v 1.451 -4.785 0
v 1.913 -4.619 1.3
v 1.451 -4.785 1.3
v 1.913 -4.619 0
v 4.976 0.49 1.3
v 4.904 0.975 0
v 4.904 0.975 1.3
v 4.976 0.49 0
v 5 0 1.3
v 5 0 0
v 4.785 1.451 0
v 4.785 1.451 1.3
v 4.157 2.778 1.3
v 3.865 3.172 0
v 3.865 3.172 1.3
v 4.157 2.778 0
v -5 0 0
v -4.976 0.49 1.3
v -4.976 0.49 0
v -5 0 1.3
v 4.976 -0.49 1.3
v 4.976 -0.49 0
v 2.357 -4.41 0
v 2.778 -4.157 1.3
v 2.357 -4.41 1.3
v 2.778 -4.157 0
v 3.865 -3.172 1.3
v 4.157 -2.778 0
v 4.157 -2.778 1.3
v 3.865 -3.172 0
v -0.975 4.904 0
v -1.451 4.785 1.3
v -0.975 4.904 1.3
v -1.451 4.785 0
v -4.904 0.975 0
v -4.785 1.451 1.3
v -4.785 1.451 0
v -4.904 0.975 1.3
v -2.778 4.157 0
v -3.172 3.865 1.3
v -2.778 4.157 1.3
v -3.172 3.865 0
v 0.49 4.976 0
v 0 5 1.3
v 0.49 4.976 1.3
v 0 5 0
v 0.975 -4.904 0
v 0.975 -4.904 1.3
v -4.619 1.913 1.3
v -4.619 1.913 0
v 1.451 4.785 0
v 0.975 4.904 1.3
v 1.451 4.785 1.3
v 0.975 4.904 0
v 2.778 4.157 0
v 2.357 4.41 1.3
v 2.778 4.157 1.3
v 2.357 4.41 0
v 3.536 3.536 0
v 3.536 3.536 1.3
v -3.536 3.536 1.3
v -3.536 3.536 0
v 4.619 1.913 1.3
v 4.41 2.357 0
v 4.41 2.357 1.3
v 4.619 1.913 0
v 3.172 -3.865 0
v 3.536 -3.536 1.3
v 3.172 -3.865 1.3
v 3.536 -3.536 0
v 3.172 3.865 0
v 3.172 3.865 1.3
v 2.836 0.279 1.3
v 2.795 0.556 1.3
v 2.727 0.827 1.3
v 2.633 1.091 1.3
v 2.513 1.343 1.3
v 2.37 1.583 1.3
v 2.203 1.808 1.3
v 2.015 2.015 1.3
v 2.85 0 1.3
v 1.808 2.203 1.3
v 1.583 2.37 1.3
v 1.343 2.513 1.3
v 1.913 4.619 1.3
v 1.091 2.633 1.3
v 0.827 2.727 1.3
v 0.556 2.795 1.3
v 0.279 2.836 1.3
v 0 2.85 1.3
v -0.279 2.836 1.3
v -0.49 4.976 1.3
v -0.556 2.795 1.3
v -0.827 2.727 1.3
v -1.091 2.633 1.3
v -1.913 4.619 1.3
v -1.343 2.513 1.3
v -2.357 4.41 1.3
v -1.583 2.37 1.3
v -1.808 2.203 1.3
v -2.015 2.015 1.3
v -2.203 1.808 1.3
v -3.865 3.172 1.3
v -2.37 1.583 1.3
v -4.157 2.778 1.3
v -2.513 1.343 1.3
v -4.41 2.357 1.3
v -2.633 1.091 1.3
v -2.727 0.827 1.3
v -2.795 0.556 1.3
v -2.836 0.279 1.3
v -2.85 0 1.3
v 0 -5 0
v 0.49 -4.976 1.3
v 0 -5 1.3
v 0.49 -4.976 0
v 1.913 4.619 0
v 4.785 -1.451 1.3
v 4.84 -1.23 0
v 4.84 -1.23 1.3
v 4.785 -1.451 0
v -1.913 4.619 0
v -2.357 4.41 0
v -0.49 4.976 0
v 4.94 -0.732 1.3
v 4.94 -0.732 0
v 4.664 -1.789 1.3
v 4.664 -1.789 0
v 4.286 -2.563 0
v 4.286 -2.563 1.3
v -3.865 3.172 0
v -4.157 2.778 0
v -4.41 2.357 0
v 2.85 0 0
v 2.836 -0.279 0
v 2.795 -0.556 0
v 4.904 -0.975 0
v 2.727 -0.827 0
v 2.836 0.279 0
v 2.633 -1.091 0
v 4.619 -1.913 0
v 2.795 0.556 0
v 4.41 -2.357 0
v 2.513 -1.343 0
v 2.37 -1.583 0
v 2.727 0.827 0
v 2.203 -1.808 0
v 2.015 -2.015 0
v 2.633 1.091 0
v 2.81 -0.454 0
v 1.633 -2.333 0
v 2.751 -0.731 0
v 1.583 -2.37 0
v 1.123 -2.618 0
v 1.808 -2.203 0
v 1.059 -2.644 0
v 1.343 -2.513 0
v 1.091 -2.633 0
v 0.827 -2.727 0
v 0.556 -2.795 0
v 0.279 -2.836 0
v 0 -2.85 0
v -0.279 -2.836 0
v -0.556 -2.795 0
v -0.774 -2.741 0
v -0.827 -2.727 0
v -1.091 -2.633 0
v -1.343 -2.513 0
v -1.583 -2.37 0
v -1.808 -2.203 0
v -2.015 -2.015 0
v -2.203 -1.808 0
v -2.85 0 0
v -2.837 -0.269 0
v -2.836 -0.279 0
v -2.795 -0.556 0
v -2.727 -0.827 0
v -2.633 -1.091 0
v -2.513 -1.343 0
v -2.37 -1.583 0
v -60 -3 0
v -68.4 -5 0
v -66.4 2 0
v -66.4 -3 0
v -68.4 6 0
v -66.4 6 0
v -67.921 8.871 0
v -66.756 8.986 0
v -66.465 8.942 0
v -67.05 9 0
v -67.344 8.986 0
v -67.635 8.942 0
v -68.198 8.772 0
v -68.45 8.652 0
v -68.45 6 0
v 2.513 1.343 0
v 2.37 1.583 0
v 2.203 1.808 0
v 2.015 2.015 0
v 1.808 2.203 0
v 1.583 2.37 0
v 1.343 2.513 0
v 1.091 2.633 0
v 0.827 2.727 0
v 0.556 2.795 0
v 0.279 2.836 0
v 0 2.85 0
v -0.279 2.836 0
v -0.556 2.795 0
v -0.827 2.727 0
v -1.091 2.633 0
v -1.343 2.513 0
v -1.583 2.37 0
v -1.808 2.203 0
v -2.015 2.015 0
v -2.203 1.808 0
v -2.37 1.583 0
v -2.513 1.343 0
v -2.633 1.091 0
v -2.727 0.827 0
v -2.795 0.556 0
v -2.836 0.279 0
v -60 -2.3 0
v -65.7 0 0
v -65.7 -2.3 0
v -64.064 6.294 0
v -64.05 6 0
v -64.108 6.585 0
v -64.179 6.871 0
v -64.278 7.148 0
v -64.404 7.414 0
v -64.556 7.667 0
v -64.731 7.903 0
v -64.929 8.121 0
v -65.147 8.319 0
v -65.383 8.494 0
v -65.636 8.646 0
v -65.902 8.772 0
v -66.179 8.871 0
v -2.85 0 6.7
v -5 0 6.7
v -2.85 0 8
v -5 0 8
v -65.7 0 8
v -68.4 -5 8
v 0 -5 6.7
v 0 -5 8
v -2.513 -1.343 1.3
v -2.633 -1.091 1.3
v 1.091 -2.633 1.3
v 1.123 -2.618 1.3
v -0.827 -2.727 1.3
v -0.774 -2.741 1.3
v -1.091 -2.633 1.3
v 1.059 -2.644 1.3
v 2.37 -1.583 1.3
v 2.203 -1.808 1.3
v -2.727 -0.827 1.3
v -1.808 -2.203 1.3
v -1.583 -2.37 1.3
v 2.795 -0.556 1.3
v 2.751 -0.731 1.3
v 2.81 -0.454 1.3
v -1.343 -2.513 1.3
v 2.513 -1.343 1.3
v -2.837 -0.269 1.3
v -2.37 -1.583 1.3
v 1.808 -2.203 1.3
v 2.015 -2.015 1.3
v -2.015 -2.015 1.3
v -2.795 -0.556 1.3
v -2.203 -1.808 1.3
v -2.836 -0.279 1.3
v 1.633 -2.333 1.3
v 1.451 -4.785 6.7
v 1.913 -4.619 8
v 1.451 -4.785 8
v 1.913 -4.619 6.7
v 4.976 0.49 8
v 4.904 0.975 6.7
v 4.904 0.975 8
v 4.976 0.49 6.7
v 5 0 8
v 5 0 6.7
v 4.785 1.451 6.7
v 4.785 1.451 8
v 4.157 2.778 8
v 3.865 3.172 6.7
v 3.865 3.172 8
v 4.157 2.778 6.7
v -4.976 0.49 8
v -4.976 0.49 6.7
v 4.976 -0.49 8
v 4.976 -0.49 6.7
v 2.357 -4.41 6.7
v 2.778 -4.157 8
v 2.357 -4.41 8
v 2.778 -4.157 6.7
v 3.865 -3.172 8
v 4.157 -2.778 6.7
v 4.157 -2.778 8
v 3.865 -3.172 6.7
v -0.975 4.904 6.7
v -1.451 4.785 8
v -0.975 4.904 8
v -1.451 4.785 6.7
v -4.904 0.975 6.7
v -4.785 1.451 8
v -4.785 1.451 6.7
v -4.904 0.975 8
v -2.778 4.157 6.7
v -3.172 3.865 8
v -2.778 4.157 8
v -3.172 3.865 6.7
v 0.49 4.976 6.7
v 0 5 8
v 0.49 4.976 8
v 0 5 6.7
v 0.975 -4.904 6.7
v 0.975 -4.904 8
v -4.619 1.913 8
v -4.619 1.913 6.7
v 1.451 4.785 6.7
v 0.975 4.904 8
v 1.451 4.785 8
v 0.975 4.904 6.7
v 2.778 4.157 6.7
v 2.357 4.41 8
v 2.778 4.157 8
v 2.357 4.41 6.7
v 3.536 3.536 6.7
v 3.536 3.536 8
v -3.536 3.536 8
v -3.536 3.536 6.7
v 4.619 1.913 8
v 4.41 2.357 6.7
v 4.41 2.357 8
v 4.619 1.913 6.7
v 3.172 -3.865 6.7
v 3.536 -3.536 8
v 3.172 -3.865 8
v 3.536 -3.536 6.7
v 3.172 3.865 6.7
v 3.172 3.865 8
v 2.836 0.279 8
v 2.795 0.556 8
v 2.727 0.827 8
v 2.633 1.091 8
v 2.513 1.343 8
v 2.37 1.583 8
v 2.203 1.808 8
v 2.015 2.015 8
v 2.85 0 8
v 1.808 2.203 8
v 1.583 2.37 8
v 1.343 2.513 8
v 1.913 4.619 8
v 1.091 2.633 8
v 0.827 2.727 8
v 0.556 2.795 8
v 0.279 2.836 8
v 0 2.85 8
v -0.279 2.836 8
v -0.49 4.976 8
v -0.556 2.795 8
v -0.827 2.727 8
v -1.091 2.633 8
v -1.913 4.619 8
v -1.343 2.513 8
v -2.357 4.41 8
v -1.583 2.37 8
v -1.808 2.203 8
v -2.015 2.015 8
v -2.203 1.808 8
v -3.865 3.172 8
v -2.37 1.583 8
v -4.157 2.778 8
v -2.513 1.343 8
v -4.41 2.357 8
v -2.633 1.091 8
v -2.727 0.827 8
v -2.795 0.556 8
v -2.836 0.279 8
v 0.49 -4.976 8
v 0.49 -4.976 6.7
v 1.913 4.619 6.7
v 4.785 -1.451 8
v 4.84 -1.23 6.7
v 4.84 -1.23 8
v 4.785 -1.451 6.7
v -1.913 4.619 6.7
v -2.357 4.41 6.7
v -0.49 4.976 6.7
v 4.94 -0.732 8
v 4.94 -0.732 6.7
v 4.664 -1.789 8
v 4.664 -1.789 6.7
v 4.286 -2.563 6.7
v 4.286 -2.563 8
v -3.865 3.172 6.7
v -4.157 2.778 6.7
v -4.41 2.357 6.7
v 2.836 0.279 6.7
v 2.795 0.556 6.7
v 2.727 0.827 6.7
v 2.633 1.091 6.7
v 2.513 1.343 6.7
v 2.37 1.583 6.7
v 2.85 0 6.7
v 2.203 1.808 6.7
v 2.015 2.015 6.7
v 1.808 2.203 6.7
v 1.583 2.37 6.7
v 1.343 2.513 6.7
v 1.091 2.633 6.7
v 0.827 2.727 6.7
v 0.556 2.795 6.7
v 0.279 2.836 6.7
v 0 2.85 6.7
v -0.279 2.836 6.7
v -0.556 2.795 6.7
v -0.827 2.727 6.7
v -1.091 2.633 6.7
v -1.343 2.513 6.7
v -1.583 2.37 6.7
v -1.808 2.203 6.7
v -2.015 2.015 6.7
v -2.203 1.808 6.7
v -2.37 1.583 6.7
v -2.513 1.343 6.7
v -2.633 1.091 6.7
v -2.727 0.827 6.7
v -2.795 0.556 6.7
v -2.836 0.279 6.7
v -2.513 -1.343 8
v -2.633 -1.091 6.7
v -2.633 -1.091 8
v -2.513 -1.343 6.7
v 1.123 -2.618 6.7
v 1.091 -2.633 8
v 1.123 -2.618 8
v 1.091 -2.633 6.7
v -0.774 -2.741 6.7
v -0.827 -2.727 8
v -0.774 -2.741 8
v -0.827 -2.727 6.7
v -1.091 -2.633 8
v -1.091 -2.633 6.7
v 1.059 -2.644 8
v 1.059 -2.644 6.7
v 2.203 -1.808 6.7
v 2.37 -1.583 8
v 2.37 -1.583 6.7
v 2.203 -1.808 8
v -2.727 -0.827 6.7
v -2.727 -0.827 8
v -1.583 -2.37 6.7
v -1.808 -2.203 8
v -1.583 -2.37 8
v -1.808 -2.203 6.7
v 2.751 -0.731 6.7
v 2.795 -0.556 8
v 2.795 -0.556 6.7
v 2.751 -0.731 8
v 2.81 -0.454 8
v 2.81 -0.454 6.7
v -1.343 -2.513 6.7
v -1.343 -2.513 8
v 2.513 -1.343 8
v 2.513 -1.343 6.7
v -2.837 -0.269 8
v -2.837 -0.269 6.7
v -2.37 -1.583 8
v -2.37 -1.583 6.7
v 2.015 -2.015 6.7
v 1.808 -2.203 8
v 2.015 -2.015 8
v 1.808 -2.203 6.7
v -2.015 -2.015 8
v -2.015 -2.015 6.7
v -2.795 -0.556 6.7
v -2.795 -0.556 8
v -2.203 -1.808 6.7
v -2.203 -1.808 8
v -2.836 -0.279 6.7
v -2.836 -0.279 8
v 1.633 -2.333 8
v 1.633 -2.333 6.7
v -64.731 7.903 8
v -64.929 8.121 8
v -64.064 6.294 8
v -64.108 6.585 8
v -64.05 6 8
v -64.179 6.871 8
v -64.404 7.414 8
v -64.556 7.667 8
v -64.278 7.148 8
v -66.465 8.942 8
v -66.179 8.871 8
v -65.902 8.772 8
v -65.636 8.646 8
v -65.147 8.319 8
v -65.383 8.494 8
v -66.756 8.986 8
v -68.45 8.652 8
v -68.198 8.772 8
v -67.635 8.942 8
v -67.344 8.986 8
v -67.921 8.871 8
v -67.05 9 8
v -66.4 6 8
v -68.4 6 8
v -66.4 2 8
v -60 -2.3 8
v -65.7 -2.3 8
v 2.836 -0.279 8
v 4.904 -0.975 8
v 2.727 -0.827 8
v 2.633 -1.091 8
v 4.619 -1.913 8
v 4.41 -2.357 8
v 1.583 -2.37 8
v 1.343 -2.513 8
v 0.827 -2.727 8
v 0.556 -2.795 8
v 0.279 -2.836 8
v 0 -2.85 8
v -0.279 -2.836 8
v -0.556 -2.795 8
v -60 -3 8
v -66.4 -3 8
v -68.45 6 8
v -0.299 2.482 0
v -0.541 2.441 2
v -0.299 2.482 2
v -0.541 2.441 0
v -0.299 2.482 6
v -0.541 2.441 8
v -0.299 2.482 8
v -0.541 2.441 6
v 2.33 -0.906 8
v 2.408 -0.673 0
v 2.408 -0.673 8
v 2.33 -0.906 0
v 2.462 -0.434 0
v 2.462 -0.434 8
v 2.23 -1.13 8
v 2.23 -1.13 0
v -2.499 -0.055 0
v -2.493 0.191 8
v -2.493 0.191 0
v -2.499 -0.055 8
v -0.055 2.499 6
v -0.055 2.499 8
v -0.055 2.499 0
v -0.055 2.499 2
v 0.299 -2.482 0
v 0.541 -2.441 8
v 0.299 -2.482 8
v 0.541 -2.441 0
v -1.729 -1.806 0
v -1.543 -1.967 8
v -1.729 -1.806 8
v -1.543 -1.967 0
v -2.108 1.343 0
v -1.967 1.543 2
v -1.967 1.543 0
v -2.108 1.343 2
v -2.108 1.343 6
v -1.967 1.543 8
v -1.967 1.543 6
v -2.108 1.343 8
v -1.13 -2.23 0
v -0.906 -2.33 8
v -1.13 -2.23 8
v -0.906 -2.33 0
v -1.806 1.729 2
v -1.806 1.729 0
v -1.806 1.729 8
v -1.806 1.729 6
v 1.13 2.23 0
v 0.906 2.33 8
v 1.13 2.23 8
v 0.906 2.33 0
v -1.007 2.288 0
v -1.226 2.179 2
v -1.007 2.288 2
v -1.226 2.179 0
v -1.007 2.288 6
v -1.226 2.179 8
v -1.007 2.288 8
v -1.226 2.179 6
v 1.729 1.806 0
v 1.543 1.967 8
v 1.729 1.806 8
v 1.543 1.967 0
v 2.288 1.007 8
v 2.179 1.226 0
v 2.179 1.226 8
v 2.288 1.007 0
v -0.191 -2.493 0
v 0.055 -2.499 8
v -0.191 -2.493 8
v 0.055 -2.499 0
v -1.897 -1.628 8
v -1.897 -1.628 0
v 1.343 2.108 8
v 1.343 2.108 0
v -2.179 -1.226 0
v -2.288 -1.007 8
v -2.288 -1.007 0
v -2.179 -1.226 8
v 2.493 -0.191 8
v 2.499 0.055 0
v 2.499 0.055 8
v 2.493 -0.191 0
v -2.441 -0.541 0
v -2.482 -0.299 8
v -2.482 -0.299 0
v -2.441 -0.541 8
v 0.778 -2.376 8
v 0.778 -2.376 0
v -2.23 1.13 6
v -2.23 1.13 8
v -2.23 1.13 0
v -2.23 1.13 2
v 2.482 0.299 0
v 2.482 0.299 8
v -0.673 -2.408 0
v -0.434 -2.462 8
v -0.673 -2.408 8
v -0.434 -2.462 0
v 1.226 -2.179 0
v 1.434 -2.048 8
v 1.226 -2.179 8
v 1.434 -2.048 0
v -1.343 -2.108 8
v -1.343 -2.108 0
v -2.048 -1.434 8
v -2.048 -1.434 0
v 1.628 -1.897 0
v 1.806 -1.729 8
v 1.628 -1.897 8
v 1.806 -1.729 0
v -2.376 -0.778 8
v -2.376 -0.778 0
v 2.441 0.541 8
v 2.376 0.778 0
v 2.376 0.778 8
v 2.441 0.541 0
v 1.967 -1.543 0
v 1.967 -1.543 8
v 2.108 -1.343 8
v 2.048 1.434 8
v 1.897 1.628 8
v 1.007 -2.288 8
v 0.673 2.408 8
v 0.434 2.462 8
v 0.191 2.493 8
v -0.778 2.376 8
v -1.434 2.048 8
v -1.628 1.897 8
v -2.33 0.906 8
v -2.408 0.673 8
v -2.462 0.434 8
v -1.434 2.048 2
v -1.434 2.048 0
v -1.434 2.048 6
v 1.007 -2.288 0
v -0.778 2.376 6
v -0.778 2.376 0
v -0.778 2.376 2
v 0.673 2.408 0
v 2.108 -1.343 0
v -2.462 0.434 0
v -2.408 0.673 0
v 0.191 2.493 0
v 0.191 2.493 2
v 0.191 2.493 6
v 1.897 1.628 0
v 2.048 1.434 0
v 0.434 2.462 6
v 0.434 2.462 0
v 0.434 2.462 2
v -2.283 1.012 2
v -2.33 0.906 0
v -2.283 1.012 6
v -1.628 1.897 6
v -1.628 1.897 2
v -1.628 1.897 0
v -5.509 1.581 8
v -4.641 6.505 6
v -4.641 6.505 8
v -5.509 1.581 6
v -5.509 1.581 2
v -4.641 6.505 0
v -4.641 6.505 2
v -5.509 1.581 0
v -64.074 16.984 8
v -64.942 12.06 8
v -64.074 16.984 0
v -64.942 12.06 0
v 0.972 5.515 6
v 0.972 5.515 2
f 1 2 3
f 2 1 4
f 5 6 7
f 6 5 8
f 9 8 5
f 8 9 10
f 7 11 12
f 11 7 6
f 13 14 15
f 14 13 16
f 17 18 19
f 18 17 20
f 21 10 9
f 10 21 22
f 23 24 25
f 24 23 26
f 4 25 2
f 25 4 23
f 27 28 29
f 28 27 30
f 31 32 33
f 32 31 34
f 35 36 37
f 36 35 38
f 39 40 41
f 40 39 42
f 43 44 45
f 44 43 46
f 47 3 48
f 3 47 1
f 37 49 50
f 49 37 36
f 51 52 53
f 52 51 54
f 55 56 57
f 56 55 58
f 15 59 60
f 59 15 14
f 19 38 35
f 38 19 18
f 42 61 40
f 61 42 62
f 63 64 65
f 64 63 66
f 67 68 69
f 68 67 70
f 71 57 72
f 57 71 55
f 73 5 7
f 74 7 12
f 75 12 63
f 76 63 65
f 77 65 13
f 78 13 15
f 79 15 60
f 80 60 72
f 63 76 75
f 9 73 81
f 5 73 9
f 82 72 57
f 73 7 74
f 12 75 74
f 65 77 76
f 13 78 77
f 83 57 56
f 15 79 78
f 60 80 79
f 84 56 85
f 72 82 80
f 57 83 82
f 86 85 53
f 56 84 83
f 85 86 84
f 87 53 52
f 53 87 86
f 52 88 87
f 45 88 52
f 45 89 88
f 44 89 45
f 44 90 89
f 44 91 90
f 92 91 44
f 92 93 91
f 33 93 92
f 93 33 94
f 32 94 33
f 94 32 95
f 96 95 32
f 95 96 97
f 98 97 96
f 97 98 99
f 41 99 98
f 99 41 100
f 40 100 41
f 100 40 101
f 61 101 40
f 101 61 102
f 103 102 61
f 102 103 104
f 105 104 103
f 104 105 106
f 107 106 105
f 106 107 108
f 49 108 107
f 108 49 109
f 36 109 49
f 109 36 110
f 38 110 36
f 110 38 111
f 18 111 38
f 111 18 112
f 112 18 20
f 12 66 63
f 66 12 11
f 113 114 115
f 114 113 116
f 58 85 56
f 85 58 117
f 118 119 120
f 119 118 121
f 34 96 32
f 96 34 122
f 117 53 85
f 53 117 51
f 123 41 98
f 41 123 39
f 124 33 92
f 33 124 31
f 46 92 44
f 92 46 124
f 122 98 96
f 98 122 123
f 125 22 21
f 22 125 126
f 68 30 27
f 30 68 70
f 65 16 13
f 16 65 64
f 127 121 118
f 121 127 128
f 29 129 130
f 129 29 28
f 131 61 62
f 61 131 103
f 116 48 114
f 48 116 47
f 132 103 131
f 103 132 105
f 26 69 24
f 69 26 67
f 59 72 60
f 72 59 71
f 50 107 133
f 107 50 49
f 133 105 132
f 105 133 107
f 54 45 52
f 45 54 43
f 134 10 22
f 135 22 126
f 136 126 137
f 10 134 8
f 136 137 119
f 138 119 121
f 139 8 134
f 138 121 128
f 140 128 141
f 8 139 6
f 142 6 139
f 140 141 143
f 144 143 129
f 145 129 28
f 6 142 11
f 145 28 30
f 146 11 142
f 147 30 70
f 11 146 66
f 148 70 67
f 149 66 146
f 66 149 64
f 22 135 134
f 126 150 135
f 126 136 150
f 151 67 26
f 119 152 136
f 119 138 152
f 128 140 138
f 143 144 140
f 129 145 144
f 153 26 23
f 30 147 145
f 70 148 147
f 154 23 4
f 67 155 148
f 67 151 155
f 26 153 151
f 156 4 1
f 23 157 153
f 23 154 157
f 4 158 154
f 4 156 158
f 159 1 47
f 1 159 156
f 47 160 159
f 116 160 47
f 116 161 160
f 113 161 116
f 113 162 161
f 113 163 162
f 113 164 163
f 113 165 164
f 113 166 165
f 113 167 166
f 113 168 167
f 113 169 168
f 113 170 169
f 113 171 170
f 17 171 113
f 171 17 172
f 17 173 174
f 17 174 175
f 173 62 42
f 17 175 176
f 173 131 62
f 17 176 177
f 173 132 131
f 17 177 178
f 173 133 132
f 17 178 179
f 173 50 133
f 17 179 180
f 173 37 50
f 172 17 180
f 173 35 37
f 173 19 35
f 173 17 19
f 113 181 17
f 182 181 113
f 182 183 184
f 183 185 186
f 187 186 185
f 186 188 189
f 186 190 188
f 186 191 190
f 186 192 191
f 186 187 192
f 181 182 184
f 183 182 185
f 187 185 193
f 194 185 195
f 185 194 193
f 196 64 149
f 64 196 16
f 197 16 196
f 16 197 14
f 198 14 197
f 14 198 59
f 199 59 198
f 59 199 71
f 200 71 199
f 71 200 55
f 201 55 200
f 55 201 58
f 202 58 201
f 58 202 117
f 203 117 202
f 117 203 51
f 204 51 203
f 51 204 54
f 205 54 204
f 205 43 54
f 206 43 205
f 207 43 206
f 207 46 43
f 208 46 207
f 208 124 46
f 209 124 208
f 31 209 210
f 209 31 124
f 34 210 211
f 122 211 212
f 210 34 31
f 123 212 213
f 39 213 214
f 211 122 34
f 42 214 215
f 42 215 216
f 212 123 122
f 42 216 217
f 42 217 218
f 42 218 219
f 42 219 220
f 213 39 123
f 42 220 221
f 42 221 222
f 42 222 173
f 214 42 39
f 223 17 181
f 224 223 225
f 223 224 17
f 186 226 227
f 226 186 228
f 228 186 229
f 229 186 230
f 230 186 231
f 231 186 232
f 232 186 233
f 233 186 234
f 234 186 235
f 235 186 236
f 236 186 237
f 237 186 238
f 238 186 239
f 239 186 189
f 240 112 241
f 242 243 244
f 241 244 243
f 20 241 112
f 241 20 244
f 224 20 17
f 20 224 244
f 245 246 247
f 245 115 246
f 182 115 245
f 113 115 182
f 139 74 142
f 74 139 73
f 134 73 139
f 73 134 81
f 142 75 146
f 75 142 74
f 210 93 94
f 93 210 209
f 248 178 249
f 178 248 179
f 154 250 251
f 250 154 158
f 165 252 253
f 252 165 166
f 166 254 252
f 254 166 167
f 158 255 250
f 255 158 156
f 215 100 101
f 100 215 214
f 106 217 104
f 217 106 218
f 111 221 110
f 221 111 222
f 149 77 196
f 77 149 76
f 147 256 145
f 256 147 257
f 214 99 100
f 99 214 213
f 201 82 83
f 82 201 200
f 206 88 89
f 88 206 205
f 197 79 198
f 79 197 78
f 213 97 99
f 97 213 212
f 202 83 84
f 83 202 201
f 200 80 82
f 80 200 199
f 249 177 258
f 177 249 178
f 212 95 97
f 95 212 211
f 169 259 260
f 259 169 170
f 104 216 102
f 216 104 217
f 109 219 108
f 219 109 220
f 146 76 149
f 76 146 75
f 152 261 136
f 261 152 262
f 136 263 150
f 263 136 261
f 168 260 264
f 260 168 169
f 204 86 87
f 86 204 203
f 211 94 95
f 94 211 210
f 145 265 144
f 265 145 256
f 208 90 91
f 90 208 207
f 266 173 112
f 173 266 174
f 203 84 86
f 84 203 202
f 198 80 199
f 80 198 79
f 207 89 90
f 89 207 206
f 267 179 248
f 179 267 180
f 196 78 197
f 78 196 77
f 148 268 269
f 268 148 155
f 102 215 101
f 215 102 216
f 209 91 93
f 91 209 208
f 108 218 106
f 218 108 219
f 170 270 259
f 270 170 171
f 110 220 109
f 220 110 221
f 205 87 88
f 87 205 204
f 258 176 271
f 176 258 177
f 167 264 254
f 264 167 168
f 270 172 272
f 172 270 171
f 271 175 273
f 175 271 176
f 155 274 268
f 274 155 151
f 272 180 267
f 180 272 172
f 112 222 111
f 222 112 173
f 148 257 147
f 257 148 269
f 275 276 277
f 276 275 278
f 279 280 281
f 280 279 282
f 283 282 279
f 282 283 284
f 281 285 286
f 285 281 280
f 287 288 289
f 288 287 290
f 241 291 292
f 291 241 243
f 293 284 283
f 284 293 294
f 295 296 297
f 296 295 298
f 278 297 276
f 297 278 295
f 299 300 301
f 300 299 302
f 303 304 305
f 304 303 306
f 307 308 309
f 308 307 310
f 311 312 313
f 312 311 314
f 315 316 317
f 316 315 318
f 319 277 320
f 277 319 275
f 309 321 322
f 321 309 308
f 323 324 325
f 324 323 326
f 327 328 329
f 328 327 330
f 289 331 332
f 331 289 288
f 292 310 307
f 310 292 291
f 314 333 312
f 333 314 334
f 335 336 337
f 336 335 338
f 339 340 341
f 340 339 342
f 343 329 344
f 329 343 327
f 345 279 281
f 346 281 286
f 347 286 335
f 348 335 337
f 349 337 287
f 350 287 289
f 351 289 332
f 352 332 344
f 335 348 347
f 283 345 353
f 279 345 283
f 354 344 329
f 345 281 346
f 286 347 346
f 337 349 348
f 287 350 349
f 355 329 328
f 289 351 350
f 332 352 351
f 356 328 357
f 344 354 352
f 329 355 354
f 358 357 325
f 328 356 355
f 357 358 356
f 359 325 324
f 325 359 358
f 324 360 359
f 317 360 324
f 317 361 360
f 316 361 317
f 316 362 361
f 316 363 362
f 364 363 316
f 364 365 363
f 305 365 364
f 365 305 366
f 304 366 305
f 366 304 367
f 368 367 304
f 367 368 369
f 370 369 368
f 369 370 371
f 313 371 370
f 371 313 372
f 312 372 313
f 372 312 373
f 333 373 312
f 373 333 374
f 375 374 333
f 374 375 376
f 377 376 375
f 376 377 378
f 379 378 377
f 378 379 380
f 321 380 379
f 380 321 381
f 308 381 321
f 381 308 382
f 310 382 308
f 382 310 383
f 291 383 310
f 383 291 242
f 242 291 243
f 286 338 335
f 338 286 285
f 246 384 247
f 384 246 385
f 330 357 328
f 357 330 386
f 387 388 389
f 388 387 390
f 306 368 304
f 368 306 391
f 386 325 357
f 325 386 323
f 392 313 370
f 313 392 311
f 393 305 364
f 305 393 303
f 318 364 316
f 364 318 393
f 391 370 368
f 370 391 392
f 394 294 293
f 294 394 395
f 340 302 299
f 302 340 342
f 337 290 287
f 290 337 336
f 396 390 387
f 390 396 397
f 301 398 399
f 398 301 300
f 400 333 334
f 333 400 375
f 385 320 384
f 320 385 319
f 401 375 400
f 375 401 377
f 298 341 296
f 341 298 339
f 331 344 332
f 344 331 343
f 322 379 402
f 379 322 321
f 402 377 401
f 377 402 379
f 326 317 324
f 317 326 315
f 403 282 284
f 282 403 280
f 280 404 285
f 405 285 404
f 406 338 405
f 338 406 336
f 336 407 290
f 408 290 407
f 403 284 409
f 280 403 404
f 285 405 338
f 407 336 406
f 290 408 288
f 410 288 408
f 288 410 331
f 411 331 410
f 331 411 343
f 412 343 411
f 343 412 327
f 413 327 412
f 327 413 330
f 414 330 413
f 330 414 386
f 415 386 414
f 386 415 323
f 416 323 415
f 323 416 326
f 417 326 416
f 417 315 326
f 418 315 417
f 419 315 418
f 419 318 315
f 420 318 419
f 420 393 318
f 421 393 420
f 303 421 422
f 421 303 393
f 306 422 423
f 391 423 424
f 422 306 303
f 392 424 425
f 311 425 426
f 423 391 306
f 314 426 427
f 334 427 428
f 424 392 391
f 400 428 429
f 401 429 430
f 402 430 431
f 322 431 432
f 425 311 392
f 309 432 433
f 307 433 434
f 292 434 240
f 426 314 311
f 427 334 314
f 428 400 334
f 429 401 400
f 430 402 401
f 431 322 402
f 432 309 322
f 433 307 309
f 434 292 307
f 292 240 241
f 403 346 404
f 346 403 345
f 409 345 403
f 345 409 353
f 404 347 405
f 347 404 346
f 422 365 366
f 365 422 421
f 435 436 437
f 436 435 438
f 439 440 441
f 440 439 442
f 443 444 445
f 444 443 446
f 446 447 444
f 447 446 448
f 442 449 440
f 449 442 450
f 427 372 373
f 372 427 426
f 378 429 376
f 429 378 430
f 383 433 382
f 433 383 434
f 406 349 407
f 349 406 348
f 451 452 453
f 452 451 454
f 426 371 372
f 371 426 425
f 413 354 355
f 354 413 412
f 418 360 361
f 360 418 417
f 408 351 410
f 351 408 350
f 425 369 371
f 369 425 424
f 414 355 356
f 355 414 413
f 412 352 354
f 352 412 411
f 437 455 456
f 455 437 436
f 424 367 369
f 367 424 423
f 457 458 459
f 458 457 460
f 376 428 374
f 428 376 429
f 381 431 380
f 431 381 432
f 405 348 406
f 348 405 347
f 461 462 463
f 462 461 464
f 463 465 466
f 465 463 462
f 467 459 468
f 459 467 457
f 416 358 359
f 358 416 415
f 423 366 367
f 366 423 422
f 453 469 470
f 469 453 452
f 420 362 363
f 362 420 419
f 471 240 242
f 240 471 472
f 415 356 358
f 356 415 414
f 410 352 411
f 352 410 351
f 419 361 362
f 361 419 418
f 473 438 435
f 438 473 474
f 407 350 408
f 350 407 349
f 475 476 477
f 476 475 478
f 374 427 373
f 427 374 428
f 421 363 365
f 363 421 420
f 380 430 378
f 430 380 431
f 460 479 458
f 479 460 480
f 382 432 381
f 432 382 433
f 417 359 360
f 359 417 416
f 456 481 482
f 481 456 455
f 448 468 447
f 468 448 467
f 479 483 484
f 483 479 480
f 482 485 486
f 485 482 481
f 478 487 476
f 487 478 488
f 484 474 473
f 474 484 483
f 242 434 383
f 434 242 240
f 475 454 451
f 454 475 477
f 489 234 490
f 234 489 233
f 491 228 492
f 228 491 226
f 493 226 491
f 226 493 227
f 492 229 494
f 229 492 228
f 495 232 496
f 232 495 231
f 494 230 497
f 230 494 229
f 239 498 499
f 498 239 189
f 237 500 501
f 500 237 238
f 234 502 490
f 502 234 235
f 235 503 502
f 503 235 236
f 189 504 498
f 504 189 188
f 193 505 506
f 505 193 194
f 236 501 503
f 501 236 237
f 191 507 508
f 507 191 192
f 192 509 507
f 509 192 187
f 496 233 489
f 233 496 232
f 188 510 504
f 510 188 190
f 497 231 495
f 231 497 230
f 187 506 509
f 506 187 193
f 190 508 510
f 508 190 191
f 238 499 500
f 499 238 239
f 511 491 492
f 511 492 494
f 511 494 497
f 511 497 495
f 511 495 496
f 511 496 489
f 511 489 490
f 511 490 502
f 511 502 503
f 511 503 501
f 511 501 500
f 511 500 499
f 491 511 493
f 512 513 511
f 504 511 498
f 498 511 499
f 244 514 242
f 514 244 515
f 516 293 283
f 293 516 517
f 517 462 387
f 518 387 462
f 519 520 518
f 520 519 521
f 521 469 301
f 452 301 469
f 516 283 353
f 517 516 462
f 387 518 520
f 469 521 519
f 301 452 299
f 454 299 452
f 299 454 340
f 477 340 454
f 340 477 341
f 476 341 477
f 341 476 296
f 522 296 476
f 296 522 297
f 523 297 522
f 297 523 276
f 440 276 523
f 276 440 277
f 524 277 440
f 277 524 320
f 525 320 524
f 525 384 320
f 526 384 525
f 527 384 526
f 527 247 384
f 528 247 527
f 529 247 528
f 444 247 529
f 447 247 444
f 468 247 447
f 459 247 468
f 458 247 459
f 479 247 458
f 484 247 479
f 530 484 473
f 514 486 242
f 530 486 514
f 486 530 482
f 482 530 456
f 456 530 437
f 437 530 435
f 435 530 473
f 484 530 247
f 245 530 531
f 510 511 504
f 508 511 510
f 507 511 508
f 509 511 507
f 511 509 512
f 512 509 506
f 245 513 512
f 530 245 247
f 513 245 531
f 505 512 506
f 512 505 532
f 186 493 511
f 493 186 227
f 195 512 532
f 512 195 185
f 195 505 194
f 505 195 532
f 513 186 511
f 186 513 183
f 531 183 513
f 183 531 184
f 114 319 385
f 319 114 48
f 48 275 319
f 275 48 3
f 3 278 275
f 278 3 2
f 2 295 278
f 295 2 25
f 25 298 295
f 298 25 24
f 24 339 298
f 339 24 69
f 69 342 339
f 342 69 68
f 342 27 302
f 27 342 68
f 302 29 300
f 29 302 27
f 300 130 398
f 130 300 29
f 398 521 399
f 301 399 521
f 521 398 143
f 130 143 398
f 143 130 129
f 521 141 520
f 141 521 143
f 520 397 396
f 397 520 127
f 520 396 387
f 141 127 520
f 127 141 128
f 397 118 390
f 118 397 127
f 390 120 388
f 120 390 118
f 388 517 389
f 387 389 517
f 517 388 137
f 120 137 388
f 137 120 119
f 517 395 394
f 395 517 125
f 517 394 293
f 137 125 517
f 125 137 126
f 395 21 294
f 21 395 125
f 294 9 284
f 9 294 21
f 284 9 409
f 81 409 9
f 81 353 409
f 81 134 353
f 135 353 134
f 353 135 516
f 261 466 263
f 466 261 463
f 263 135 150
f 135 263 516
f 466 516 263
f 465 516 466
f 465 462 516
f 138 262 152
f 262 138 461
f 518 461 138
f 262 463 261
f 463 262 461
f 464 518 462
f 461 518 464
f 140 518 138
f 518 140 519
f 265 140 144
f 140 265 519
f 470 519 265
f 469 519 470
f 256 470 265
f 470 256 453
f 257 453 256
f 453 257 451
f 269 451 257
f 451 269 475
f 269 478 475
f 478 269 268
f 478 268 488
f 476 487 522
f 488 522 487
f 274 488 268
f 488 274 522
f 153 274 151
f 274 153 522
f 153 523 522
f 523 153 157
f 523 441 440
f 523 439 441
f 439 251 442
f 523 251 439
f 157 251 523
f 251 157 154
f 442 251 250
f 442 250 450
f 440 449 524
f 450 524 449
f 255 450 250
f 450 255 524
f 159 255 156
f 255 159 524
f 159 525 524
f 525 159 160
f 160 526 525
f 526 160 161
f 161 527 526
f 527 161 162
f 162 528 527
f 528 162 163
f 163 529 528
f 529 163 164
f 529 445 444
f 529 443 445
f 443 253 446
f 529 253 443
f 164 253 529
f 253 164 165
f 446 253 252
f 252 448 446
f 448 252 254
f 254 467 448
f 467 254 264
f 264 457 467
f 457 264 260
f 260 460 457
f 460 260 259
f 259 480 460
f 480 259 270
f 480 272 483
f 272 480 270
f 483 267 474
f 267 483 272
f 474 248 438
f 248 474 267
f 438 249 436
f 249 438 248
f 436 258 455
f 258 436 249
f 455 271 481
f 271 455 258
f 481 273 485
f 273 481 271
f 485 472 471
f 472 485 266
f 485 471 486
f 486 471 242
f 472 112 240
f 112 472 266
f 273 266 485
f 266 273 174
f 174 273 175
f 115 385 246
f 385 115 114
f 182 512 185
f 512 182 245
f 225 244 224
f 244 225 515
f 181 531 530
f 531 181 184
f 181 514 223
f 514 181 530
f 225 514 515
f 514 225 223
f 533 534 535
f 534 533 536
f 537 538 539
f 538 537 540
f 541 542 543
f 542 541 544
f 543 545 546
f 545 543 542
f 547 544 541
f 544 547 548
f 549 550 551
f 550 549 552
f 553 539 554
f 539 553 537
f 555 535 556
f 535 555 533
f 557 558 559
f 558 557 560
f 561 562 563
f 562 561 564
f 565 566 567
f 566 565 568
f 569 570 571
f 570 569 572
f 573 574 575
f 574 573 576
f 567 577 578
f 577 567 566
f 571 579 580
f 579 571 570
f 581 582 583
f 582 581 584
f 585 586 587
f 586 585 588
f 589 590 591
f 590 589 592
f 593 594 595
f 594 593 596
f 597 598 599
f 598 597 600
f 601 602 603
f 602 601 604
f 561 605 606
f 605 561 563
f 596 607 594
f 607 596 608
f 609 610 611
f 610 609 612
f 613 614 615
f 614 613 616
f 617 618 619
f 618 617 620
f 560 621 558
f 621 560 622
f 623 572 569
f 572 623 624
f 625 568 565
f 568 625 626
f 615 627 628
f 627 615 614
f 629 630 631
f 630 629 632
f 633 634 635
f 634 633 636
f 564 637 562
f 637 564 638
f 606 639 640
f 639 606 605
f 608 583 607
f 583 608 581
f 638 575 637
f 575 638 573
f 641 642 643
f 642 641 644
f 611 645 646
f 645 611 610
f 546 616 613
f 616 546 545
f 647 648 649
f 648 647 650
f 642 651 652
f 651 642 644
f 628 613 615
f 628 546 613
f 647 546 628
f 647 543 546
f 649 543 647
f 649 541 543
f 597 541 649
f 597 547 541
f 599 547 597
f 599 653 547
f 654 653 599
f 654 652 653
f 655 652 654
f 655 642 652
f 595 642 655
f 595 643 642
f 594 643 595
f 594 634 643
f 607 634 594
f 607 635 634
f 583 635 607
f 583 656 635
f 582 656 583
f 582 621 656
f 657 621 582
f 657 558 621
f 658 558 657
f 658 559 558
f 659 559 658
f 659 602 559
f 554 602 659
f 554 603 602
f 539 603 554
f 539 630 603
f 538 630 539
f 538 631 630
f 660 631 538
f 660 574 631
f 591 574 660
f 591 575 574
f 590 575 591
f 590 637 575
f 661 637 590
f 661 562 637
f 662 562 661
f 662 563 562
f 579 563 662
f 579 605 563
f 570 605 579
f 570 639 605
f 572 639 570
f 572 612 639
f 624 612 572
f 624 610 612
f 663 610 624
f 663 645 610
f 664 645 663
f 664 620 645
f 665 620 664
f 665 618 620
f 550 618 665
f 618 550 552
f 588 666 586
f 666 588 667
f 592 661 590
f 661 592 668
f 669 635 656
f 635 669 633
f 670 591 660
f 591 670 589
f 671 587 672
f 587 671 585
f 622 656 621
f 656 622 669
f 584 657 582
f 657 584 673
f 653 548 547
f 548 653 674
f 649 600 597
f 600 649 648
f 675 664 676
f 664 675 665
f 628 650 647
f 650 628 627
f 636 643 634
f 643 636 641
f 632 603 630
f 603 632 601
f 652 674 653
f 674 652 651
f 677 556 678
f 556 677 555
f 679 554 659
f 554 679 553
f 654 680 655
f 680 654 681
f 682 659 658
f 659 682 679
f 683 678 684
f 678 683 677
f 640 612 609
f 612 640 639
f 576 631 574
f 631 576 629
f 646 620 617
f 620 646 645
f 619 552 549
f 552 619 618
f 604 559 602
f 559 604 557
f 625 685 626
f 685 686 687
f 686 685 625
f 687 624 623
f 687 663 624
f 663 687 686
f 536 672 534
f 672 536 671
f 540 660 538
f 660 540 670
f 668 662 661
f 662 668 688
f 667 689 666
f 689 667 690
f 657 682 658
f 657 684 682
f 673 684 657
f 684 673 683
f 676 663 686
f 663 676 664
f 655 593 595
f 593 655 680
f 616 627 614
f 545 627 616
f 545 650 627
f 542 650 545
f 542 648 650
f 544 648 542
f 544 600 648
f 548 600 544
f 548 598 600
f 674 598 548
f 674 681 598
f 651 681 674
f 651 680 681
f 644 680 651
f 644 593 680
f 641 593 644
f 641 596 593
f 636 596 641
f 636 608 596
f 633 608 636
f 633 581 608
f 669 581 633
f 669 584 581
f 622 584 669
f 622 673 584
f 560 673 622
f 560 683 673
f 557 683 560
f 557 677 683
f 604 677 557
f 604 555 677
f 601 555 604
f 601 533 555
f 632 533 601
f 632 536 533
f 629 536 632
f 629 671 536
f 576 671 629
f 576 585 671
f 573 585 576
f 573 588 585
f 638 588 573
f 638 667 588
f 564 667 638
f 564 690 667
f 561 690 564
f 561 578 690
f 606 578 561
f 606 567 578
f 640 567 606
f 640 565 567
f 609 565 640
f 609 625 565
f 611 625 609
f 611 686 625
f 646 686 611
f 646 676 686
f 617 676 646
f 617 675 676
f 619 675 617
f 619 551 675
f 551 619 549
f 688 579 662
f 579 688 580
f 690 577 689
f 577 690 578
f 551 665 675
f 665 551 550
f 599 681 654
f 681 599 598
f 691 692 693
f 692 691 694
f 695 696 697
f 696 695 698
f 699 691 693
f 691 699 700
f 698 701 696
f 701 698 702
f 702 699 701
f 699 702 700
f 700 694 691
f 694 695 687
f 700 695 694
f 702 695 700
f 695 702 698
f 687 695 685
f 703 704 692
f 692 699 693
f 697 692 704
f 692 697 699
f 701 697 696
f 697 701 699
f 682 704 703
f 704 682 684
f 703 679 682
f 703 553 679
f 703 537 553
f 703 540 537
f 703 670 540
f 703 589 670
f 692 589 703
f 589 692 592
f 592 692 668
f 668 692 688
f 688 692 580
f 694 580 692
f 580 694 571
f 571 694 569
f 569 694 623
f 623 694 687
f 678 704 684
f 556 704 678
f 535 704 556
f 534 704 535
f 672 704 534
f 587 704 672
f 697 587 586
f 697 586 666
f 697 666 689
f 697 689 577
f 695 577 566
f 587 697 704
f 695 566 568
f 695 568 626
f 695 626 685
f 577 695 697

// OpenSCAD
// Parametric Bag Clip - PLA compatible
// https://www.thingiverse.com/thing:3388572
// by Bikecyclist
// https://www.thingiverse.com/Bikecyclist
//
// Remixed from Bag Clip - PLA compatible
// https://www.thingiverse.com/thing:330151
// by MasterFX
// https://www.thingiverse.com/MasterFX

toothpaste = 1;
t_paste=.6;

// Effective clip length - clamp bags of this width.
l_clip = 60;

// Width of clip (per arm)
w_clip = 5;

// Height of clip
h_clip = 8;

// Thickness of the hook
th_hook = 2;

// Thickness of the ridge
th_ridge = 1.5;

// Tolerance between parts
tol = .7;

// Opening angle for print (must be < 90 or parts will fuse)
alpha = 10;

/* [Hidden] */

// Number of facets
$fn = 64;

// Small distance to ensure proper meshing
eps = 0.01;


translate ([-(l_clip/2 + w_clip + tol), -w_clip/2, 0])
difference ()
{
    union ()
    {
        //Clip Body
        translate ([-tol/2, 0, 0])
        ccube ([l_clip + tol, w_clip, h_clip]);

        //Axle to Body Connection
        eye ();
        
        linear_extrude (h_clip, convexity = 10)
        projection (cut = false)
        intersection ()
        {
            eye ();
            
            translate ([2 * w_clip + tol + eps, 0, 0])
            ccube ([l_clip, w_clip, h_clip]);
        }
        
        //Hook Body
        translate ([-l_clip/2 - th_hook/2 - tol, (w_clip + th_hook)/2, 0])
        ccube ([th_hook, 2 * w_clip + th_hook, h_clip]);

        //Hook Barb
        translate ([-l_clip/2 - th_hook/2 - tol/2,  w_clip*3/2+tol+t_paste/2*toothpaste, 0])
        difference(){
            cylinder(d=6, h=h_clip);
            
            translate([-10,-20,-.1])
            cube([20,20,h_clip+1]);
            translate([-20.7-tol,-10,-.1])
            cube([20,20,h_clip+1]);
        }    
        
        *translate ([-l_clip/2 - th_hook/2 - tol, 3/2 * w_clip + th_hook, 0])
        linear_extrude (h_clip)
        polygon 
        ([
            [0, th_hook/2 + tol],
            [3/2*th_hook, -tol],
            [-th_hook/2, -tol],
            [-th_hook/2, th_hook/2 + tol],
        ]);
    }
    
    //Hook Gap
    translate ([-l_clip/2 - tol/2, th_hook, -eps])
    ccube ([tol, w_clip, h_clip + 2 * eps]);
    
    //Flexibility Cut
    translate ([-(l_clip + tol)/2 + w_clip/2 + tol/2, -w_clip/2 + th_hook + tol/2, -eps])
    ccube ([w_clip+tol*2, tol, h_clip + 2 * eps]);
    
    //Ridge Recess
    if(toothpaste == 0){
        translate ([0, w_clip/2, h_clip/2])
        rotate ([45, 0, 0])
        cube ([l_clip + 2 * eps, sqrt(2) * th_ridge + tol/2, sqrt(2) * th_ridge + tol/2], center = true);
    }
}

rotate ([0, 0, -alpha])
translate ([-(l_clip/2 + w_clip) - tol, -w_clip/2, 0])
translate ([0, w_clip, 0])
mirror ([0, 1, 0])
{
    //Axle
    translate ([l_clip/2 + w_clip + tol, 1/2 * w_clip, 0])
    cylinder (d = w_clip, h = h_clip);

    //Clip Body
    translate ([-tol/4, -t_paste*toothpaste, 0])
    ccube ([l_clip + tol/2, w_clip, h_clip]);
    
    //Axle to Body Connection
    translate ([w_clip/2 + tol, -t_paste*toothpaste, h_clip/2])
    cube ([l_clip + w_clip, w_clip, h_clip/2], center = true);

    //Ridge
    if(toothpaste == 0){
        translate ([-tol/4, w_clip/2, h_clip/2])
        rotate ([45, 0, 0])
        cube ([l_clip + tol/2, sqrt(2) * th_ridge, sqrt(2) * th_ridge], center = true);
    }
}

module eye ()
{
    for (i = [-1, 1])
    translate ([w_clip + tol, 0, h_clip/2 - (h_clip/4 - tol)/2 + i * (h_clip/2 - (h_clip/4 - tol)/2)])
    difference ()
    {
        union ()
        {
            translate ([l_clip/2, w_clip/2, 0])
            cylinder (d = 2 * w_clip, h = h_clip/4 - tol);
            
            ccube ([l_clip, w_clip, h_clip/4 - tol]);
        }
        
        translate ([l_clip/2, w_clip/2, 0])
        translate ([0, 0, -eps])
        cylinder (d = w_clip + tol, h = h_clip + 2 * eps);
    }

}

module ccube (dim)
{
    translate ([0, 0, dim [2]/2])
    cube ([dim [0], dim [1], dim [2]], center = true);
}
